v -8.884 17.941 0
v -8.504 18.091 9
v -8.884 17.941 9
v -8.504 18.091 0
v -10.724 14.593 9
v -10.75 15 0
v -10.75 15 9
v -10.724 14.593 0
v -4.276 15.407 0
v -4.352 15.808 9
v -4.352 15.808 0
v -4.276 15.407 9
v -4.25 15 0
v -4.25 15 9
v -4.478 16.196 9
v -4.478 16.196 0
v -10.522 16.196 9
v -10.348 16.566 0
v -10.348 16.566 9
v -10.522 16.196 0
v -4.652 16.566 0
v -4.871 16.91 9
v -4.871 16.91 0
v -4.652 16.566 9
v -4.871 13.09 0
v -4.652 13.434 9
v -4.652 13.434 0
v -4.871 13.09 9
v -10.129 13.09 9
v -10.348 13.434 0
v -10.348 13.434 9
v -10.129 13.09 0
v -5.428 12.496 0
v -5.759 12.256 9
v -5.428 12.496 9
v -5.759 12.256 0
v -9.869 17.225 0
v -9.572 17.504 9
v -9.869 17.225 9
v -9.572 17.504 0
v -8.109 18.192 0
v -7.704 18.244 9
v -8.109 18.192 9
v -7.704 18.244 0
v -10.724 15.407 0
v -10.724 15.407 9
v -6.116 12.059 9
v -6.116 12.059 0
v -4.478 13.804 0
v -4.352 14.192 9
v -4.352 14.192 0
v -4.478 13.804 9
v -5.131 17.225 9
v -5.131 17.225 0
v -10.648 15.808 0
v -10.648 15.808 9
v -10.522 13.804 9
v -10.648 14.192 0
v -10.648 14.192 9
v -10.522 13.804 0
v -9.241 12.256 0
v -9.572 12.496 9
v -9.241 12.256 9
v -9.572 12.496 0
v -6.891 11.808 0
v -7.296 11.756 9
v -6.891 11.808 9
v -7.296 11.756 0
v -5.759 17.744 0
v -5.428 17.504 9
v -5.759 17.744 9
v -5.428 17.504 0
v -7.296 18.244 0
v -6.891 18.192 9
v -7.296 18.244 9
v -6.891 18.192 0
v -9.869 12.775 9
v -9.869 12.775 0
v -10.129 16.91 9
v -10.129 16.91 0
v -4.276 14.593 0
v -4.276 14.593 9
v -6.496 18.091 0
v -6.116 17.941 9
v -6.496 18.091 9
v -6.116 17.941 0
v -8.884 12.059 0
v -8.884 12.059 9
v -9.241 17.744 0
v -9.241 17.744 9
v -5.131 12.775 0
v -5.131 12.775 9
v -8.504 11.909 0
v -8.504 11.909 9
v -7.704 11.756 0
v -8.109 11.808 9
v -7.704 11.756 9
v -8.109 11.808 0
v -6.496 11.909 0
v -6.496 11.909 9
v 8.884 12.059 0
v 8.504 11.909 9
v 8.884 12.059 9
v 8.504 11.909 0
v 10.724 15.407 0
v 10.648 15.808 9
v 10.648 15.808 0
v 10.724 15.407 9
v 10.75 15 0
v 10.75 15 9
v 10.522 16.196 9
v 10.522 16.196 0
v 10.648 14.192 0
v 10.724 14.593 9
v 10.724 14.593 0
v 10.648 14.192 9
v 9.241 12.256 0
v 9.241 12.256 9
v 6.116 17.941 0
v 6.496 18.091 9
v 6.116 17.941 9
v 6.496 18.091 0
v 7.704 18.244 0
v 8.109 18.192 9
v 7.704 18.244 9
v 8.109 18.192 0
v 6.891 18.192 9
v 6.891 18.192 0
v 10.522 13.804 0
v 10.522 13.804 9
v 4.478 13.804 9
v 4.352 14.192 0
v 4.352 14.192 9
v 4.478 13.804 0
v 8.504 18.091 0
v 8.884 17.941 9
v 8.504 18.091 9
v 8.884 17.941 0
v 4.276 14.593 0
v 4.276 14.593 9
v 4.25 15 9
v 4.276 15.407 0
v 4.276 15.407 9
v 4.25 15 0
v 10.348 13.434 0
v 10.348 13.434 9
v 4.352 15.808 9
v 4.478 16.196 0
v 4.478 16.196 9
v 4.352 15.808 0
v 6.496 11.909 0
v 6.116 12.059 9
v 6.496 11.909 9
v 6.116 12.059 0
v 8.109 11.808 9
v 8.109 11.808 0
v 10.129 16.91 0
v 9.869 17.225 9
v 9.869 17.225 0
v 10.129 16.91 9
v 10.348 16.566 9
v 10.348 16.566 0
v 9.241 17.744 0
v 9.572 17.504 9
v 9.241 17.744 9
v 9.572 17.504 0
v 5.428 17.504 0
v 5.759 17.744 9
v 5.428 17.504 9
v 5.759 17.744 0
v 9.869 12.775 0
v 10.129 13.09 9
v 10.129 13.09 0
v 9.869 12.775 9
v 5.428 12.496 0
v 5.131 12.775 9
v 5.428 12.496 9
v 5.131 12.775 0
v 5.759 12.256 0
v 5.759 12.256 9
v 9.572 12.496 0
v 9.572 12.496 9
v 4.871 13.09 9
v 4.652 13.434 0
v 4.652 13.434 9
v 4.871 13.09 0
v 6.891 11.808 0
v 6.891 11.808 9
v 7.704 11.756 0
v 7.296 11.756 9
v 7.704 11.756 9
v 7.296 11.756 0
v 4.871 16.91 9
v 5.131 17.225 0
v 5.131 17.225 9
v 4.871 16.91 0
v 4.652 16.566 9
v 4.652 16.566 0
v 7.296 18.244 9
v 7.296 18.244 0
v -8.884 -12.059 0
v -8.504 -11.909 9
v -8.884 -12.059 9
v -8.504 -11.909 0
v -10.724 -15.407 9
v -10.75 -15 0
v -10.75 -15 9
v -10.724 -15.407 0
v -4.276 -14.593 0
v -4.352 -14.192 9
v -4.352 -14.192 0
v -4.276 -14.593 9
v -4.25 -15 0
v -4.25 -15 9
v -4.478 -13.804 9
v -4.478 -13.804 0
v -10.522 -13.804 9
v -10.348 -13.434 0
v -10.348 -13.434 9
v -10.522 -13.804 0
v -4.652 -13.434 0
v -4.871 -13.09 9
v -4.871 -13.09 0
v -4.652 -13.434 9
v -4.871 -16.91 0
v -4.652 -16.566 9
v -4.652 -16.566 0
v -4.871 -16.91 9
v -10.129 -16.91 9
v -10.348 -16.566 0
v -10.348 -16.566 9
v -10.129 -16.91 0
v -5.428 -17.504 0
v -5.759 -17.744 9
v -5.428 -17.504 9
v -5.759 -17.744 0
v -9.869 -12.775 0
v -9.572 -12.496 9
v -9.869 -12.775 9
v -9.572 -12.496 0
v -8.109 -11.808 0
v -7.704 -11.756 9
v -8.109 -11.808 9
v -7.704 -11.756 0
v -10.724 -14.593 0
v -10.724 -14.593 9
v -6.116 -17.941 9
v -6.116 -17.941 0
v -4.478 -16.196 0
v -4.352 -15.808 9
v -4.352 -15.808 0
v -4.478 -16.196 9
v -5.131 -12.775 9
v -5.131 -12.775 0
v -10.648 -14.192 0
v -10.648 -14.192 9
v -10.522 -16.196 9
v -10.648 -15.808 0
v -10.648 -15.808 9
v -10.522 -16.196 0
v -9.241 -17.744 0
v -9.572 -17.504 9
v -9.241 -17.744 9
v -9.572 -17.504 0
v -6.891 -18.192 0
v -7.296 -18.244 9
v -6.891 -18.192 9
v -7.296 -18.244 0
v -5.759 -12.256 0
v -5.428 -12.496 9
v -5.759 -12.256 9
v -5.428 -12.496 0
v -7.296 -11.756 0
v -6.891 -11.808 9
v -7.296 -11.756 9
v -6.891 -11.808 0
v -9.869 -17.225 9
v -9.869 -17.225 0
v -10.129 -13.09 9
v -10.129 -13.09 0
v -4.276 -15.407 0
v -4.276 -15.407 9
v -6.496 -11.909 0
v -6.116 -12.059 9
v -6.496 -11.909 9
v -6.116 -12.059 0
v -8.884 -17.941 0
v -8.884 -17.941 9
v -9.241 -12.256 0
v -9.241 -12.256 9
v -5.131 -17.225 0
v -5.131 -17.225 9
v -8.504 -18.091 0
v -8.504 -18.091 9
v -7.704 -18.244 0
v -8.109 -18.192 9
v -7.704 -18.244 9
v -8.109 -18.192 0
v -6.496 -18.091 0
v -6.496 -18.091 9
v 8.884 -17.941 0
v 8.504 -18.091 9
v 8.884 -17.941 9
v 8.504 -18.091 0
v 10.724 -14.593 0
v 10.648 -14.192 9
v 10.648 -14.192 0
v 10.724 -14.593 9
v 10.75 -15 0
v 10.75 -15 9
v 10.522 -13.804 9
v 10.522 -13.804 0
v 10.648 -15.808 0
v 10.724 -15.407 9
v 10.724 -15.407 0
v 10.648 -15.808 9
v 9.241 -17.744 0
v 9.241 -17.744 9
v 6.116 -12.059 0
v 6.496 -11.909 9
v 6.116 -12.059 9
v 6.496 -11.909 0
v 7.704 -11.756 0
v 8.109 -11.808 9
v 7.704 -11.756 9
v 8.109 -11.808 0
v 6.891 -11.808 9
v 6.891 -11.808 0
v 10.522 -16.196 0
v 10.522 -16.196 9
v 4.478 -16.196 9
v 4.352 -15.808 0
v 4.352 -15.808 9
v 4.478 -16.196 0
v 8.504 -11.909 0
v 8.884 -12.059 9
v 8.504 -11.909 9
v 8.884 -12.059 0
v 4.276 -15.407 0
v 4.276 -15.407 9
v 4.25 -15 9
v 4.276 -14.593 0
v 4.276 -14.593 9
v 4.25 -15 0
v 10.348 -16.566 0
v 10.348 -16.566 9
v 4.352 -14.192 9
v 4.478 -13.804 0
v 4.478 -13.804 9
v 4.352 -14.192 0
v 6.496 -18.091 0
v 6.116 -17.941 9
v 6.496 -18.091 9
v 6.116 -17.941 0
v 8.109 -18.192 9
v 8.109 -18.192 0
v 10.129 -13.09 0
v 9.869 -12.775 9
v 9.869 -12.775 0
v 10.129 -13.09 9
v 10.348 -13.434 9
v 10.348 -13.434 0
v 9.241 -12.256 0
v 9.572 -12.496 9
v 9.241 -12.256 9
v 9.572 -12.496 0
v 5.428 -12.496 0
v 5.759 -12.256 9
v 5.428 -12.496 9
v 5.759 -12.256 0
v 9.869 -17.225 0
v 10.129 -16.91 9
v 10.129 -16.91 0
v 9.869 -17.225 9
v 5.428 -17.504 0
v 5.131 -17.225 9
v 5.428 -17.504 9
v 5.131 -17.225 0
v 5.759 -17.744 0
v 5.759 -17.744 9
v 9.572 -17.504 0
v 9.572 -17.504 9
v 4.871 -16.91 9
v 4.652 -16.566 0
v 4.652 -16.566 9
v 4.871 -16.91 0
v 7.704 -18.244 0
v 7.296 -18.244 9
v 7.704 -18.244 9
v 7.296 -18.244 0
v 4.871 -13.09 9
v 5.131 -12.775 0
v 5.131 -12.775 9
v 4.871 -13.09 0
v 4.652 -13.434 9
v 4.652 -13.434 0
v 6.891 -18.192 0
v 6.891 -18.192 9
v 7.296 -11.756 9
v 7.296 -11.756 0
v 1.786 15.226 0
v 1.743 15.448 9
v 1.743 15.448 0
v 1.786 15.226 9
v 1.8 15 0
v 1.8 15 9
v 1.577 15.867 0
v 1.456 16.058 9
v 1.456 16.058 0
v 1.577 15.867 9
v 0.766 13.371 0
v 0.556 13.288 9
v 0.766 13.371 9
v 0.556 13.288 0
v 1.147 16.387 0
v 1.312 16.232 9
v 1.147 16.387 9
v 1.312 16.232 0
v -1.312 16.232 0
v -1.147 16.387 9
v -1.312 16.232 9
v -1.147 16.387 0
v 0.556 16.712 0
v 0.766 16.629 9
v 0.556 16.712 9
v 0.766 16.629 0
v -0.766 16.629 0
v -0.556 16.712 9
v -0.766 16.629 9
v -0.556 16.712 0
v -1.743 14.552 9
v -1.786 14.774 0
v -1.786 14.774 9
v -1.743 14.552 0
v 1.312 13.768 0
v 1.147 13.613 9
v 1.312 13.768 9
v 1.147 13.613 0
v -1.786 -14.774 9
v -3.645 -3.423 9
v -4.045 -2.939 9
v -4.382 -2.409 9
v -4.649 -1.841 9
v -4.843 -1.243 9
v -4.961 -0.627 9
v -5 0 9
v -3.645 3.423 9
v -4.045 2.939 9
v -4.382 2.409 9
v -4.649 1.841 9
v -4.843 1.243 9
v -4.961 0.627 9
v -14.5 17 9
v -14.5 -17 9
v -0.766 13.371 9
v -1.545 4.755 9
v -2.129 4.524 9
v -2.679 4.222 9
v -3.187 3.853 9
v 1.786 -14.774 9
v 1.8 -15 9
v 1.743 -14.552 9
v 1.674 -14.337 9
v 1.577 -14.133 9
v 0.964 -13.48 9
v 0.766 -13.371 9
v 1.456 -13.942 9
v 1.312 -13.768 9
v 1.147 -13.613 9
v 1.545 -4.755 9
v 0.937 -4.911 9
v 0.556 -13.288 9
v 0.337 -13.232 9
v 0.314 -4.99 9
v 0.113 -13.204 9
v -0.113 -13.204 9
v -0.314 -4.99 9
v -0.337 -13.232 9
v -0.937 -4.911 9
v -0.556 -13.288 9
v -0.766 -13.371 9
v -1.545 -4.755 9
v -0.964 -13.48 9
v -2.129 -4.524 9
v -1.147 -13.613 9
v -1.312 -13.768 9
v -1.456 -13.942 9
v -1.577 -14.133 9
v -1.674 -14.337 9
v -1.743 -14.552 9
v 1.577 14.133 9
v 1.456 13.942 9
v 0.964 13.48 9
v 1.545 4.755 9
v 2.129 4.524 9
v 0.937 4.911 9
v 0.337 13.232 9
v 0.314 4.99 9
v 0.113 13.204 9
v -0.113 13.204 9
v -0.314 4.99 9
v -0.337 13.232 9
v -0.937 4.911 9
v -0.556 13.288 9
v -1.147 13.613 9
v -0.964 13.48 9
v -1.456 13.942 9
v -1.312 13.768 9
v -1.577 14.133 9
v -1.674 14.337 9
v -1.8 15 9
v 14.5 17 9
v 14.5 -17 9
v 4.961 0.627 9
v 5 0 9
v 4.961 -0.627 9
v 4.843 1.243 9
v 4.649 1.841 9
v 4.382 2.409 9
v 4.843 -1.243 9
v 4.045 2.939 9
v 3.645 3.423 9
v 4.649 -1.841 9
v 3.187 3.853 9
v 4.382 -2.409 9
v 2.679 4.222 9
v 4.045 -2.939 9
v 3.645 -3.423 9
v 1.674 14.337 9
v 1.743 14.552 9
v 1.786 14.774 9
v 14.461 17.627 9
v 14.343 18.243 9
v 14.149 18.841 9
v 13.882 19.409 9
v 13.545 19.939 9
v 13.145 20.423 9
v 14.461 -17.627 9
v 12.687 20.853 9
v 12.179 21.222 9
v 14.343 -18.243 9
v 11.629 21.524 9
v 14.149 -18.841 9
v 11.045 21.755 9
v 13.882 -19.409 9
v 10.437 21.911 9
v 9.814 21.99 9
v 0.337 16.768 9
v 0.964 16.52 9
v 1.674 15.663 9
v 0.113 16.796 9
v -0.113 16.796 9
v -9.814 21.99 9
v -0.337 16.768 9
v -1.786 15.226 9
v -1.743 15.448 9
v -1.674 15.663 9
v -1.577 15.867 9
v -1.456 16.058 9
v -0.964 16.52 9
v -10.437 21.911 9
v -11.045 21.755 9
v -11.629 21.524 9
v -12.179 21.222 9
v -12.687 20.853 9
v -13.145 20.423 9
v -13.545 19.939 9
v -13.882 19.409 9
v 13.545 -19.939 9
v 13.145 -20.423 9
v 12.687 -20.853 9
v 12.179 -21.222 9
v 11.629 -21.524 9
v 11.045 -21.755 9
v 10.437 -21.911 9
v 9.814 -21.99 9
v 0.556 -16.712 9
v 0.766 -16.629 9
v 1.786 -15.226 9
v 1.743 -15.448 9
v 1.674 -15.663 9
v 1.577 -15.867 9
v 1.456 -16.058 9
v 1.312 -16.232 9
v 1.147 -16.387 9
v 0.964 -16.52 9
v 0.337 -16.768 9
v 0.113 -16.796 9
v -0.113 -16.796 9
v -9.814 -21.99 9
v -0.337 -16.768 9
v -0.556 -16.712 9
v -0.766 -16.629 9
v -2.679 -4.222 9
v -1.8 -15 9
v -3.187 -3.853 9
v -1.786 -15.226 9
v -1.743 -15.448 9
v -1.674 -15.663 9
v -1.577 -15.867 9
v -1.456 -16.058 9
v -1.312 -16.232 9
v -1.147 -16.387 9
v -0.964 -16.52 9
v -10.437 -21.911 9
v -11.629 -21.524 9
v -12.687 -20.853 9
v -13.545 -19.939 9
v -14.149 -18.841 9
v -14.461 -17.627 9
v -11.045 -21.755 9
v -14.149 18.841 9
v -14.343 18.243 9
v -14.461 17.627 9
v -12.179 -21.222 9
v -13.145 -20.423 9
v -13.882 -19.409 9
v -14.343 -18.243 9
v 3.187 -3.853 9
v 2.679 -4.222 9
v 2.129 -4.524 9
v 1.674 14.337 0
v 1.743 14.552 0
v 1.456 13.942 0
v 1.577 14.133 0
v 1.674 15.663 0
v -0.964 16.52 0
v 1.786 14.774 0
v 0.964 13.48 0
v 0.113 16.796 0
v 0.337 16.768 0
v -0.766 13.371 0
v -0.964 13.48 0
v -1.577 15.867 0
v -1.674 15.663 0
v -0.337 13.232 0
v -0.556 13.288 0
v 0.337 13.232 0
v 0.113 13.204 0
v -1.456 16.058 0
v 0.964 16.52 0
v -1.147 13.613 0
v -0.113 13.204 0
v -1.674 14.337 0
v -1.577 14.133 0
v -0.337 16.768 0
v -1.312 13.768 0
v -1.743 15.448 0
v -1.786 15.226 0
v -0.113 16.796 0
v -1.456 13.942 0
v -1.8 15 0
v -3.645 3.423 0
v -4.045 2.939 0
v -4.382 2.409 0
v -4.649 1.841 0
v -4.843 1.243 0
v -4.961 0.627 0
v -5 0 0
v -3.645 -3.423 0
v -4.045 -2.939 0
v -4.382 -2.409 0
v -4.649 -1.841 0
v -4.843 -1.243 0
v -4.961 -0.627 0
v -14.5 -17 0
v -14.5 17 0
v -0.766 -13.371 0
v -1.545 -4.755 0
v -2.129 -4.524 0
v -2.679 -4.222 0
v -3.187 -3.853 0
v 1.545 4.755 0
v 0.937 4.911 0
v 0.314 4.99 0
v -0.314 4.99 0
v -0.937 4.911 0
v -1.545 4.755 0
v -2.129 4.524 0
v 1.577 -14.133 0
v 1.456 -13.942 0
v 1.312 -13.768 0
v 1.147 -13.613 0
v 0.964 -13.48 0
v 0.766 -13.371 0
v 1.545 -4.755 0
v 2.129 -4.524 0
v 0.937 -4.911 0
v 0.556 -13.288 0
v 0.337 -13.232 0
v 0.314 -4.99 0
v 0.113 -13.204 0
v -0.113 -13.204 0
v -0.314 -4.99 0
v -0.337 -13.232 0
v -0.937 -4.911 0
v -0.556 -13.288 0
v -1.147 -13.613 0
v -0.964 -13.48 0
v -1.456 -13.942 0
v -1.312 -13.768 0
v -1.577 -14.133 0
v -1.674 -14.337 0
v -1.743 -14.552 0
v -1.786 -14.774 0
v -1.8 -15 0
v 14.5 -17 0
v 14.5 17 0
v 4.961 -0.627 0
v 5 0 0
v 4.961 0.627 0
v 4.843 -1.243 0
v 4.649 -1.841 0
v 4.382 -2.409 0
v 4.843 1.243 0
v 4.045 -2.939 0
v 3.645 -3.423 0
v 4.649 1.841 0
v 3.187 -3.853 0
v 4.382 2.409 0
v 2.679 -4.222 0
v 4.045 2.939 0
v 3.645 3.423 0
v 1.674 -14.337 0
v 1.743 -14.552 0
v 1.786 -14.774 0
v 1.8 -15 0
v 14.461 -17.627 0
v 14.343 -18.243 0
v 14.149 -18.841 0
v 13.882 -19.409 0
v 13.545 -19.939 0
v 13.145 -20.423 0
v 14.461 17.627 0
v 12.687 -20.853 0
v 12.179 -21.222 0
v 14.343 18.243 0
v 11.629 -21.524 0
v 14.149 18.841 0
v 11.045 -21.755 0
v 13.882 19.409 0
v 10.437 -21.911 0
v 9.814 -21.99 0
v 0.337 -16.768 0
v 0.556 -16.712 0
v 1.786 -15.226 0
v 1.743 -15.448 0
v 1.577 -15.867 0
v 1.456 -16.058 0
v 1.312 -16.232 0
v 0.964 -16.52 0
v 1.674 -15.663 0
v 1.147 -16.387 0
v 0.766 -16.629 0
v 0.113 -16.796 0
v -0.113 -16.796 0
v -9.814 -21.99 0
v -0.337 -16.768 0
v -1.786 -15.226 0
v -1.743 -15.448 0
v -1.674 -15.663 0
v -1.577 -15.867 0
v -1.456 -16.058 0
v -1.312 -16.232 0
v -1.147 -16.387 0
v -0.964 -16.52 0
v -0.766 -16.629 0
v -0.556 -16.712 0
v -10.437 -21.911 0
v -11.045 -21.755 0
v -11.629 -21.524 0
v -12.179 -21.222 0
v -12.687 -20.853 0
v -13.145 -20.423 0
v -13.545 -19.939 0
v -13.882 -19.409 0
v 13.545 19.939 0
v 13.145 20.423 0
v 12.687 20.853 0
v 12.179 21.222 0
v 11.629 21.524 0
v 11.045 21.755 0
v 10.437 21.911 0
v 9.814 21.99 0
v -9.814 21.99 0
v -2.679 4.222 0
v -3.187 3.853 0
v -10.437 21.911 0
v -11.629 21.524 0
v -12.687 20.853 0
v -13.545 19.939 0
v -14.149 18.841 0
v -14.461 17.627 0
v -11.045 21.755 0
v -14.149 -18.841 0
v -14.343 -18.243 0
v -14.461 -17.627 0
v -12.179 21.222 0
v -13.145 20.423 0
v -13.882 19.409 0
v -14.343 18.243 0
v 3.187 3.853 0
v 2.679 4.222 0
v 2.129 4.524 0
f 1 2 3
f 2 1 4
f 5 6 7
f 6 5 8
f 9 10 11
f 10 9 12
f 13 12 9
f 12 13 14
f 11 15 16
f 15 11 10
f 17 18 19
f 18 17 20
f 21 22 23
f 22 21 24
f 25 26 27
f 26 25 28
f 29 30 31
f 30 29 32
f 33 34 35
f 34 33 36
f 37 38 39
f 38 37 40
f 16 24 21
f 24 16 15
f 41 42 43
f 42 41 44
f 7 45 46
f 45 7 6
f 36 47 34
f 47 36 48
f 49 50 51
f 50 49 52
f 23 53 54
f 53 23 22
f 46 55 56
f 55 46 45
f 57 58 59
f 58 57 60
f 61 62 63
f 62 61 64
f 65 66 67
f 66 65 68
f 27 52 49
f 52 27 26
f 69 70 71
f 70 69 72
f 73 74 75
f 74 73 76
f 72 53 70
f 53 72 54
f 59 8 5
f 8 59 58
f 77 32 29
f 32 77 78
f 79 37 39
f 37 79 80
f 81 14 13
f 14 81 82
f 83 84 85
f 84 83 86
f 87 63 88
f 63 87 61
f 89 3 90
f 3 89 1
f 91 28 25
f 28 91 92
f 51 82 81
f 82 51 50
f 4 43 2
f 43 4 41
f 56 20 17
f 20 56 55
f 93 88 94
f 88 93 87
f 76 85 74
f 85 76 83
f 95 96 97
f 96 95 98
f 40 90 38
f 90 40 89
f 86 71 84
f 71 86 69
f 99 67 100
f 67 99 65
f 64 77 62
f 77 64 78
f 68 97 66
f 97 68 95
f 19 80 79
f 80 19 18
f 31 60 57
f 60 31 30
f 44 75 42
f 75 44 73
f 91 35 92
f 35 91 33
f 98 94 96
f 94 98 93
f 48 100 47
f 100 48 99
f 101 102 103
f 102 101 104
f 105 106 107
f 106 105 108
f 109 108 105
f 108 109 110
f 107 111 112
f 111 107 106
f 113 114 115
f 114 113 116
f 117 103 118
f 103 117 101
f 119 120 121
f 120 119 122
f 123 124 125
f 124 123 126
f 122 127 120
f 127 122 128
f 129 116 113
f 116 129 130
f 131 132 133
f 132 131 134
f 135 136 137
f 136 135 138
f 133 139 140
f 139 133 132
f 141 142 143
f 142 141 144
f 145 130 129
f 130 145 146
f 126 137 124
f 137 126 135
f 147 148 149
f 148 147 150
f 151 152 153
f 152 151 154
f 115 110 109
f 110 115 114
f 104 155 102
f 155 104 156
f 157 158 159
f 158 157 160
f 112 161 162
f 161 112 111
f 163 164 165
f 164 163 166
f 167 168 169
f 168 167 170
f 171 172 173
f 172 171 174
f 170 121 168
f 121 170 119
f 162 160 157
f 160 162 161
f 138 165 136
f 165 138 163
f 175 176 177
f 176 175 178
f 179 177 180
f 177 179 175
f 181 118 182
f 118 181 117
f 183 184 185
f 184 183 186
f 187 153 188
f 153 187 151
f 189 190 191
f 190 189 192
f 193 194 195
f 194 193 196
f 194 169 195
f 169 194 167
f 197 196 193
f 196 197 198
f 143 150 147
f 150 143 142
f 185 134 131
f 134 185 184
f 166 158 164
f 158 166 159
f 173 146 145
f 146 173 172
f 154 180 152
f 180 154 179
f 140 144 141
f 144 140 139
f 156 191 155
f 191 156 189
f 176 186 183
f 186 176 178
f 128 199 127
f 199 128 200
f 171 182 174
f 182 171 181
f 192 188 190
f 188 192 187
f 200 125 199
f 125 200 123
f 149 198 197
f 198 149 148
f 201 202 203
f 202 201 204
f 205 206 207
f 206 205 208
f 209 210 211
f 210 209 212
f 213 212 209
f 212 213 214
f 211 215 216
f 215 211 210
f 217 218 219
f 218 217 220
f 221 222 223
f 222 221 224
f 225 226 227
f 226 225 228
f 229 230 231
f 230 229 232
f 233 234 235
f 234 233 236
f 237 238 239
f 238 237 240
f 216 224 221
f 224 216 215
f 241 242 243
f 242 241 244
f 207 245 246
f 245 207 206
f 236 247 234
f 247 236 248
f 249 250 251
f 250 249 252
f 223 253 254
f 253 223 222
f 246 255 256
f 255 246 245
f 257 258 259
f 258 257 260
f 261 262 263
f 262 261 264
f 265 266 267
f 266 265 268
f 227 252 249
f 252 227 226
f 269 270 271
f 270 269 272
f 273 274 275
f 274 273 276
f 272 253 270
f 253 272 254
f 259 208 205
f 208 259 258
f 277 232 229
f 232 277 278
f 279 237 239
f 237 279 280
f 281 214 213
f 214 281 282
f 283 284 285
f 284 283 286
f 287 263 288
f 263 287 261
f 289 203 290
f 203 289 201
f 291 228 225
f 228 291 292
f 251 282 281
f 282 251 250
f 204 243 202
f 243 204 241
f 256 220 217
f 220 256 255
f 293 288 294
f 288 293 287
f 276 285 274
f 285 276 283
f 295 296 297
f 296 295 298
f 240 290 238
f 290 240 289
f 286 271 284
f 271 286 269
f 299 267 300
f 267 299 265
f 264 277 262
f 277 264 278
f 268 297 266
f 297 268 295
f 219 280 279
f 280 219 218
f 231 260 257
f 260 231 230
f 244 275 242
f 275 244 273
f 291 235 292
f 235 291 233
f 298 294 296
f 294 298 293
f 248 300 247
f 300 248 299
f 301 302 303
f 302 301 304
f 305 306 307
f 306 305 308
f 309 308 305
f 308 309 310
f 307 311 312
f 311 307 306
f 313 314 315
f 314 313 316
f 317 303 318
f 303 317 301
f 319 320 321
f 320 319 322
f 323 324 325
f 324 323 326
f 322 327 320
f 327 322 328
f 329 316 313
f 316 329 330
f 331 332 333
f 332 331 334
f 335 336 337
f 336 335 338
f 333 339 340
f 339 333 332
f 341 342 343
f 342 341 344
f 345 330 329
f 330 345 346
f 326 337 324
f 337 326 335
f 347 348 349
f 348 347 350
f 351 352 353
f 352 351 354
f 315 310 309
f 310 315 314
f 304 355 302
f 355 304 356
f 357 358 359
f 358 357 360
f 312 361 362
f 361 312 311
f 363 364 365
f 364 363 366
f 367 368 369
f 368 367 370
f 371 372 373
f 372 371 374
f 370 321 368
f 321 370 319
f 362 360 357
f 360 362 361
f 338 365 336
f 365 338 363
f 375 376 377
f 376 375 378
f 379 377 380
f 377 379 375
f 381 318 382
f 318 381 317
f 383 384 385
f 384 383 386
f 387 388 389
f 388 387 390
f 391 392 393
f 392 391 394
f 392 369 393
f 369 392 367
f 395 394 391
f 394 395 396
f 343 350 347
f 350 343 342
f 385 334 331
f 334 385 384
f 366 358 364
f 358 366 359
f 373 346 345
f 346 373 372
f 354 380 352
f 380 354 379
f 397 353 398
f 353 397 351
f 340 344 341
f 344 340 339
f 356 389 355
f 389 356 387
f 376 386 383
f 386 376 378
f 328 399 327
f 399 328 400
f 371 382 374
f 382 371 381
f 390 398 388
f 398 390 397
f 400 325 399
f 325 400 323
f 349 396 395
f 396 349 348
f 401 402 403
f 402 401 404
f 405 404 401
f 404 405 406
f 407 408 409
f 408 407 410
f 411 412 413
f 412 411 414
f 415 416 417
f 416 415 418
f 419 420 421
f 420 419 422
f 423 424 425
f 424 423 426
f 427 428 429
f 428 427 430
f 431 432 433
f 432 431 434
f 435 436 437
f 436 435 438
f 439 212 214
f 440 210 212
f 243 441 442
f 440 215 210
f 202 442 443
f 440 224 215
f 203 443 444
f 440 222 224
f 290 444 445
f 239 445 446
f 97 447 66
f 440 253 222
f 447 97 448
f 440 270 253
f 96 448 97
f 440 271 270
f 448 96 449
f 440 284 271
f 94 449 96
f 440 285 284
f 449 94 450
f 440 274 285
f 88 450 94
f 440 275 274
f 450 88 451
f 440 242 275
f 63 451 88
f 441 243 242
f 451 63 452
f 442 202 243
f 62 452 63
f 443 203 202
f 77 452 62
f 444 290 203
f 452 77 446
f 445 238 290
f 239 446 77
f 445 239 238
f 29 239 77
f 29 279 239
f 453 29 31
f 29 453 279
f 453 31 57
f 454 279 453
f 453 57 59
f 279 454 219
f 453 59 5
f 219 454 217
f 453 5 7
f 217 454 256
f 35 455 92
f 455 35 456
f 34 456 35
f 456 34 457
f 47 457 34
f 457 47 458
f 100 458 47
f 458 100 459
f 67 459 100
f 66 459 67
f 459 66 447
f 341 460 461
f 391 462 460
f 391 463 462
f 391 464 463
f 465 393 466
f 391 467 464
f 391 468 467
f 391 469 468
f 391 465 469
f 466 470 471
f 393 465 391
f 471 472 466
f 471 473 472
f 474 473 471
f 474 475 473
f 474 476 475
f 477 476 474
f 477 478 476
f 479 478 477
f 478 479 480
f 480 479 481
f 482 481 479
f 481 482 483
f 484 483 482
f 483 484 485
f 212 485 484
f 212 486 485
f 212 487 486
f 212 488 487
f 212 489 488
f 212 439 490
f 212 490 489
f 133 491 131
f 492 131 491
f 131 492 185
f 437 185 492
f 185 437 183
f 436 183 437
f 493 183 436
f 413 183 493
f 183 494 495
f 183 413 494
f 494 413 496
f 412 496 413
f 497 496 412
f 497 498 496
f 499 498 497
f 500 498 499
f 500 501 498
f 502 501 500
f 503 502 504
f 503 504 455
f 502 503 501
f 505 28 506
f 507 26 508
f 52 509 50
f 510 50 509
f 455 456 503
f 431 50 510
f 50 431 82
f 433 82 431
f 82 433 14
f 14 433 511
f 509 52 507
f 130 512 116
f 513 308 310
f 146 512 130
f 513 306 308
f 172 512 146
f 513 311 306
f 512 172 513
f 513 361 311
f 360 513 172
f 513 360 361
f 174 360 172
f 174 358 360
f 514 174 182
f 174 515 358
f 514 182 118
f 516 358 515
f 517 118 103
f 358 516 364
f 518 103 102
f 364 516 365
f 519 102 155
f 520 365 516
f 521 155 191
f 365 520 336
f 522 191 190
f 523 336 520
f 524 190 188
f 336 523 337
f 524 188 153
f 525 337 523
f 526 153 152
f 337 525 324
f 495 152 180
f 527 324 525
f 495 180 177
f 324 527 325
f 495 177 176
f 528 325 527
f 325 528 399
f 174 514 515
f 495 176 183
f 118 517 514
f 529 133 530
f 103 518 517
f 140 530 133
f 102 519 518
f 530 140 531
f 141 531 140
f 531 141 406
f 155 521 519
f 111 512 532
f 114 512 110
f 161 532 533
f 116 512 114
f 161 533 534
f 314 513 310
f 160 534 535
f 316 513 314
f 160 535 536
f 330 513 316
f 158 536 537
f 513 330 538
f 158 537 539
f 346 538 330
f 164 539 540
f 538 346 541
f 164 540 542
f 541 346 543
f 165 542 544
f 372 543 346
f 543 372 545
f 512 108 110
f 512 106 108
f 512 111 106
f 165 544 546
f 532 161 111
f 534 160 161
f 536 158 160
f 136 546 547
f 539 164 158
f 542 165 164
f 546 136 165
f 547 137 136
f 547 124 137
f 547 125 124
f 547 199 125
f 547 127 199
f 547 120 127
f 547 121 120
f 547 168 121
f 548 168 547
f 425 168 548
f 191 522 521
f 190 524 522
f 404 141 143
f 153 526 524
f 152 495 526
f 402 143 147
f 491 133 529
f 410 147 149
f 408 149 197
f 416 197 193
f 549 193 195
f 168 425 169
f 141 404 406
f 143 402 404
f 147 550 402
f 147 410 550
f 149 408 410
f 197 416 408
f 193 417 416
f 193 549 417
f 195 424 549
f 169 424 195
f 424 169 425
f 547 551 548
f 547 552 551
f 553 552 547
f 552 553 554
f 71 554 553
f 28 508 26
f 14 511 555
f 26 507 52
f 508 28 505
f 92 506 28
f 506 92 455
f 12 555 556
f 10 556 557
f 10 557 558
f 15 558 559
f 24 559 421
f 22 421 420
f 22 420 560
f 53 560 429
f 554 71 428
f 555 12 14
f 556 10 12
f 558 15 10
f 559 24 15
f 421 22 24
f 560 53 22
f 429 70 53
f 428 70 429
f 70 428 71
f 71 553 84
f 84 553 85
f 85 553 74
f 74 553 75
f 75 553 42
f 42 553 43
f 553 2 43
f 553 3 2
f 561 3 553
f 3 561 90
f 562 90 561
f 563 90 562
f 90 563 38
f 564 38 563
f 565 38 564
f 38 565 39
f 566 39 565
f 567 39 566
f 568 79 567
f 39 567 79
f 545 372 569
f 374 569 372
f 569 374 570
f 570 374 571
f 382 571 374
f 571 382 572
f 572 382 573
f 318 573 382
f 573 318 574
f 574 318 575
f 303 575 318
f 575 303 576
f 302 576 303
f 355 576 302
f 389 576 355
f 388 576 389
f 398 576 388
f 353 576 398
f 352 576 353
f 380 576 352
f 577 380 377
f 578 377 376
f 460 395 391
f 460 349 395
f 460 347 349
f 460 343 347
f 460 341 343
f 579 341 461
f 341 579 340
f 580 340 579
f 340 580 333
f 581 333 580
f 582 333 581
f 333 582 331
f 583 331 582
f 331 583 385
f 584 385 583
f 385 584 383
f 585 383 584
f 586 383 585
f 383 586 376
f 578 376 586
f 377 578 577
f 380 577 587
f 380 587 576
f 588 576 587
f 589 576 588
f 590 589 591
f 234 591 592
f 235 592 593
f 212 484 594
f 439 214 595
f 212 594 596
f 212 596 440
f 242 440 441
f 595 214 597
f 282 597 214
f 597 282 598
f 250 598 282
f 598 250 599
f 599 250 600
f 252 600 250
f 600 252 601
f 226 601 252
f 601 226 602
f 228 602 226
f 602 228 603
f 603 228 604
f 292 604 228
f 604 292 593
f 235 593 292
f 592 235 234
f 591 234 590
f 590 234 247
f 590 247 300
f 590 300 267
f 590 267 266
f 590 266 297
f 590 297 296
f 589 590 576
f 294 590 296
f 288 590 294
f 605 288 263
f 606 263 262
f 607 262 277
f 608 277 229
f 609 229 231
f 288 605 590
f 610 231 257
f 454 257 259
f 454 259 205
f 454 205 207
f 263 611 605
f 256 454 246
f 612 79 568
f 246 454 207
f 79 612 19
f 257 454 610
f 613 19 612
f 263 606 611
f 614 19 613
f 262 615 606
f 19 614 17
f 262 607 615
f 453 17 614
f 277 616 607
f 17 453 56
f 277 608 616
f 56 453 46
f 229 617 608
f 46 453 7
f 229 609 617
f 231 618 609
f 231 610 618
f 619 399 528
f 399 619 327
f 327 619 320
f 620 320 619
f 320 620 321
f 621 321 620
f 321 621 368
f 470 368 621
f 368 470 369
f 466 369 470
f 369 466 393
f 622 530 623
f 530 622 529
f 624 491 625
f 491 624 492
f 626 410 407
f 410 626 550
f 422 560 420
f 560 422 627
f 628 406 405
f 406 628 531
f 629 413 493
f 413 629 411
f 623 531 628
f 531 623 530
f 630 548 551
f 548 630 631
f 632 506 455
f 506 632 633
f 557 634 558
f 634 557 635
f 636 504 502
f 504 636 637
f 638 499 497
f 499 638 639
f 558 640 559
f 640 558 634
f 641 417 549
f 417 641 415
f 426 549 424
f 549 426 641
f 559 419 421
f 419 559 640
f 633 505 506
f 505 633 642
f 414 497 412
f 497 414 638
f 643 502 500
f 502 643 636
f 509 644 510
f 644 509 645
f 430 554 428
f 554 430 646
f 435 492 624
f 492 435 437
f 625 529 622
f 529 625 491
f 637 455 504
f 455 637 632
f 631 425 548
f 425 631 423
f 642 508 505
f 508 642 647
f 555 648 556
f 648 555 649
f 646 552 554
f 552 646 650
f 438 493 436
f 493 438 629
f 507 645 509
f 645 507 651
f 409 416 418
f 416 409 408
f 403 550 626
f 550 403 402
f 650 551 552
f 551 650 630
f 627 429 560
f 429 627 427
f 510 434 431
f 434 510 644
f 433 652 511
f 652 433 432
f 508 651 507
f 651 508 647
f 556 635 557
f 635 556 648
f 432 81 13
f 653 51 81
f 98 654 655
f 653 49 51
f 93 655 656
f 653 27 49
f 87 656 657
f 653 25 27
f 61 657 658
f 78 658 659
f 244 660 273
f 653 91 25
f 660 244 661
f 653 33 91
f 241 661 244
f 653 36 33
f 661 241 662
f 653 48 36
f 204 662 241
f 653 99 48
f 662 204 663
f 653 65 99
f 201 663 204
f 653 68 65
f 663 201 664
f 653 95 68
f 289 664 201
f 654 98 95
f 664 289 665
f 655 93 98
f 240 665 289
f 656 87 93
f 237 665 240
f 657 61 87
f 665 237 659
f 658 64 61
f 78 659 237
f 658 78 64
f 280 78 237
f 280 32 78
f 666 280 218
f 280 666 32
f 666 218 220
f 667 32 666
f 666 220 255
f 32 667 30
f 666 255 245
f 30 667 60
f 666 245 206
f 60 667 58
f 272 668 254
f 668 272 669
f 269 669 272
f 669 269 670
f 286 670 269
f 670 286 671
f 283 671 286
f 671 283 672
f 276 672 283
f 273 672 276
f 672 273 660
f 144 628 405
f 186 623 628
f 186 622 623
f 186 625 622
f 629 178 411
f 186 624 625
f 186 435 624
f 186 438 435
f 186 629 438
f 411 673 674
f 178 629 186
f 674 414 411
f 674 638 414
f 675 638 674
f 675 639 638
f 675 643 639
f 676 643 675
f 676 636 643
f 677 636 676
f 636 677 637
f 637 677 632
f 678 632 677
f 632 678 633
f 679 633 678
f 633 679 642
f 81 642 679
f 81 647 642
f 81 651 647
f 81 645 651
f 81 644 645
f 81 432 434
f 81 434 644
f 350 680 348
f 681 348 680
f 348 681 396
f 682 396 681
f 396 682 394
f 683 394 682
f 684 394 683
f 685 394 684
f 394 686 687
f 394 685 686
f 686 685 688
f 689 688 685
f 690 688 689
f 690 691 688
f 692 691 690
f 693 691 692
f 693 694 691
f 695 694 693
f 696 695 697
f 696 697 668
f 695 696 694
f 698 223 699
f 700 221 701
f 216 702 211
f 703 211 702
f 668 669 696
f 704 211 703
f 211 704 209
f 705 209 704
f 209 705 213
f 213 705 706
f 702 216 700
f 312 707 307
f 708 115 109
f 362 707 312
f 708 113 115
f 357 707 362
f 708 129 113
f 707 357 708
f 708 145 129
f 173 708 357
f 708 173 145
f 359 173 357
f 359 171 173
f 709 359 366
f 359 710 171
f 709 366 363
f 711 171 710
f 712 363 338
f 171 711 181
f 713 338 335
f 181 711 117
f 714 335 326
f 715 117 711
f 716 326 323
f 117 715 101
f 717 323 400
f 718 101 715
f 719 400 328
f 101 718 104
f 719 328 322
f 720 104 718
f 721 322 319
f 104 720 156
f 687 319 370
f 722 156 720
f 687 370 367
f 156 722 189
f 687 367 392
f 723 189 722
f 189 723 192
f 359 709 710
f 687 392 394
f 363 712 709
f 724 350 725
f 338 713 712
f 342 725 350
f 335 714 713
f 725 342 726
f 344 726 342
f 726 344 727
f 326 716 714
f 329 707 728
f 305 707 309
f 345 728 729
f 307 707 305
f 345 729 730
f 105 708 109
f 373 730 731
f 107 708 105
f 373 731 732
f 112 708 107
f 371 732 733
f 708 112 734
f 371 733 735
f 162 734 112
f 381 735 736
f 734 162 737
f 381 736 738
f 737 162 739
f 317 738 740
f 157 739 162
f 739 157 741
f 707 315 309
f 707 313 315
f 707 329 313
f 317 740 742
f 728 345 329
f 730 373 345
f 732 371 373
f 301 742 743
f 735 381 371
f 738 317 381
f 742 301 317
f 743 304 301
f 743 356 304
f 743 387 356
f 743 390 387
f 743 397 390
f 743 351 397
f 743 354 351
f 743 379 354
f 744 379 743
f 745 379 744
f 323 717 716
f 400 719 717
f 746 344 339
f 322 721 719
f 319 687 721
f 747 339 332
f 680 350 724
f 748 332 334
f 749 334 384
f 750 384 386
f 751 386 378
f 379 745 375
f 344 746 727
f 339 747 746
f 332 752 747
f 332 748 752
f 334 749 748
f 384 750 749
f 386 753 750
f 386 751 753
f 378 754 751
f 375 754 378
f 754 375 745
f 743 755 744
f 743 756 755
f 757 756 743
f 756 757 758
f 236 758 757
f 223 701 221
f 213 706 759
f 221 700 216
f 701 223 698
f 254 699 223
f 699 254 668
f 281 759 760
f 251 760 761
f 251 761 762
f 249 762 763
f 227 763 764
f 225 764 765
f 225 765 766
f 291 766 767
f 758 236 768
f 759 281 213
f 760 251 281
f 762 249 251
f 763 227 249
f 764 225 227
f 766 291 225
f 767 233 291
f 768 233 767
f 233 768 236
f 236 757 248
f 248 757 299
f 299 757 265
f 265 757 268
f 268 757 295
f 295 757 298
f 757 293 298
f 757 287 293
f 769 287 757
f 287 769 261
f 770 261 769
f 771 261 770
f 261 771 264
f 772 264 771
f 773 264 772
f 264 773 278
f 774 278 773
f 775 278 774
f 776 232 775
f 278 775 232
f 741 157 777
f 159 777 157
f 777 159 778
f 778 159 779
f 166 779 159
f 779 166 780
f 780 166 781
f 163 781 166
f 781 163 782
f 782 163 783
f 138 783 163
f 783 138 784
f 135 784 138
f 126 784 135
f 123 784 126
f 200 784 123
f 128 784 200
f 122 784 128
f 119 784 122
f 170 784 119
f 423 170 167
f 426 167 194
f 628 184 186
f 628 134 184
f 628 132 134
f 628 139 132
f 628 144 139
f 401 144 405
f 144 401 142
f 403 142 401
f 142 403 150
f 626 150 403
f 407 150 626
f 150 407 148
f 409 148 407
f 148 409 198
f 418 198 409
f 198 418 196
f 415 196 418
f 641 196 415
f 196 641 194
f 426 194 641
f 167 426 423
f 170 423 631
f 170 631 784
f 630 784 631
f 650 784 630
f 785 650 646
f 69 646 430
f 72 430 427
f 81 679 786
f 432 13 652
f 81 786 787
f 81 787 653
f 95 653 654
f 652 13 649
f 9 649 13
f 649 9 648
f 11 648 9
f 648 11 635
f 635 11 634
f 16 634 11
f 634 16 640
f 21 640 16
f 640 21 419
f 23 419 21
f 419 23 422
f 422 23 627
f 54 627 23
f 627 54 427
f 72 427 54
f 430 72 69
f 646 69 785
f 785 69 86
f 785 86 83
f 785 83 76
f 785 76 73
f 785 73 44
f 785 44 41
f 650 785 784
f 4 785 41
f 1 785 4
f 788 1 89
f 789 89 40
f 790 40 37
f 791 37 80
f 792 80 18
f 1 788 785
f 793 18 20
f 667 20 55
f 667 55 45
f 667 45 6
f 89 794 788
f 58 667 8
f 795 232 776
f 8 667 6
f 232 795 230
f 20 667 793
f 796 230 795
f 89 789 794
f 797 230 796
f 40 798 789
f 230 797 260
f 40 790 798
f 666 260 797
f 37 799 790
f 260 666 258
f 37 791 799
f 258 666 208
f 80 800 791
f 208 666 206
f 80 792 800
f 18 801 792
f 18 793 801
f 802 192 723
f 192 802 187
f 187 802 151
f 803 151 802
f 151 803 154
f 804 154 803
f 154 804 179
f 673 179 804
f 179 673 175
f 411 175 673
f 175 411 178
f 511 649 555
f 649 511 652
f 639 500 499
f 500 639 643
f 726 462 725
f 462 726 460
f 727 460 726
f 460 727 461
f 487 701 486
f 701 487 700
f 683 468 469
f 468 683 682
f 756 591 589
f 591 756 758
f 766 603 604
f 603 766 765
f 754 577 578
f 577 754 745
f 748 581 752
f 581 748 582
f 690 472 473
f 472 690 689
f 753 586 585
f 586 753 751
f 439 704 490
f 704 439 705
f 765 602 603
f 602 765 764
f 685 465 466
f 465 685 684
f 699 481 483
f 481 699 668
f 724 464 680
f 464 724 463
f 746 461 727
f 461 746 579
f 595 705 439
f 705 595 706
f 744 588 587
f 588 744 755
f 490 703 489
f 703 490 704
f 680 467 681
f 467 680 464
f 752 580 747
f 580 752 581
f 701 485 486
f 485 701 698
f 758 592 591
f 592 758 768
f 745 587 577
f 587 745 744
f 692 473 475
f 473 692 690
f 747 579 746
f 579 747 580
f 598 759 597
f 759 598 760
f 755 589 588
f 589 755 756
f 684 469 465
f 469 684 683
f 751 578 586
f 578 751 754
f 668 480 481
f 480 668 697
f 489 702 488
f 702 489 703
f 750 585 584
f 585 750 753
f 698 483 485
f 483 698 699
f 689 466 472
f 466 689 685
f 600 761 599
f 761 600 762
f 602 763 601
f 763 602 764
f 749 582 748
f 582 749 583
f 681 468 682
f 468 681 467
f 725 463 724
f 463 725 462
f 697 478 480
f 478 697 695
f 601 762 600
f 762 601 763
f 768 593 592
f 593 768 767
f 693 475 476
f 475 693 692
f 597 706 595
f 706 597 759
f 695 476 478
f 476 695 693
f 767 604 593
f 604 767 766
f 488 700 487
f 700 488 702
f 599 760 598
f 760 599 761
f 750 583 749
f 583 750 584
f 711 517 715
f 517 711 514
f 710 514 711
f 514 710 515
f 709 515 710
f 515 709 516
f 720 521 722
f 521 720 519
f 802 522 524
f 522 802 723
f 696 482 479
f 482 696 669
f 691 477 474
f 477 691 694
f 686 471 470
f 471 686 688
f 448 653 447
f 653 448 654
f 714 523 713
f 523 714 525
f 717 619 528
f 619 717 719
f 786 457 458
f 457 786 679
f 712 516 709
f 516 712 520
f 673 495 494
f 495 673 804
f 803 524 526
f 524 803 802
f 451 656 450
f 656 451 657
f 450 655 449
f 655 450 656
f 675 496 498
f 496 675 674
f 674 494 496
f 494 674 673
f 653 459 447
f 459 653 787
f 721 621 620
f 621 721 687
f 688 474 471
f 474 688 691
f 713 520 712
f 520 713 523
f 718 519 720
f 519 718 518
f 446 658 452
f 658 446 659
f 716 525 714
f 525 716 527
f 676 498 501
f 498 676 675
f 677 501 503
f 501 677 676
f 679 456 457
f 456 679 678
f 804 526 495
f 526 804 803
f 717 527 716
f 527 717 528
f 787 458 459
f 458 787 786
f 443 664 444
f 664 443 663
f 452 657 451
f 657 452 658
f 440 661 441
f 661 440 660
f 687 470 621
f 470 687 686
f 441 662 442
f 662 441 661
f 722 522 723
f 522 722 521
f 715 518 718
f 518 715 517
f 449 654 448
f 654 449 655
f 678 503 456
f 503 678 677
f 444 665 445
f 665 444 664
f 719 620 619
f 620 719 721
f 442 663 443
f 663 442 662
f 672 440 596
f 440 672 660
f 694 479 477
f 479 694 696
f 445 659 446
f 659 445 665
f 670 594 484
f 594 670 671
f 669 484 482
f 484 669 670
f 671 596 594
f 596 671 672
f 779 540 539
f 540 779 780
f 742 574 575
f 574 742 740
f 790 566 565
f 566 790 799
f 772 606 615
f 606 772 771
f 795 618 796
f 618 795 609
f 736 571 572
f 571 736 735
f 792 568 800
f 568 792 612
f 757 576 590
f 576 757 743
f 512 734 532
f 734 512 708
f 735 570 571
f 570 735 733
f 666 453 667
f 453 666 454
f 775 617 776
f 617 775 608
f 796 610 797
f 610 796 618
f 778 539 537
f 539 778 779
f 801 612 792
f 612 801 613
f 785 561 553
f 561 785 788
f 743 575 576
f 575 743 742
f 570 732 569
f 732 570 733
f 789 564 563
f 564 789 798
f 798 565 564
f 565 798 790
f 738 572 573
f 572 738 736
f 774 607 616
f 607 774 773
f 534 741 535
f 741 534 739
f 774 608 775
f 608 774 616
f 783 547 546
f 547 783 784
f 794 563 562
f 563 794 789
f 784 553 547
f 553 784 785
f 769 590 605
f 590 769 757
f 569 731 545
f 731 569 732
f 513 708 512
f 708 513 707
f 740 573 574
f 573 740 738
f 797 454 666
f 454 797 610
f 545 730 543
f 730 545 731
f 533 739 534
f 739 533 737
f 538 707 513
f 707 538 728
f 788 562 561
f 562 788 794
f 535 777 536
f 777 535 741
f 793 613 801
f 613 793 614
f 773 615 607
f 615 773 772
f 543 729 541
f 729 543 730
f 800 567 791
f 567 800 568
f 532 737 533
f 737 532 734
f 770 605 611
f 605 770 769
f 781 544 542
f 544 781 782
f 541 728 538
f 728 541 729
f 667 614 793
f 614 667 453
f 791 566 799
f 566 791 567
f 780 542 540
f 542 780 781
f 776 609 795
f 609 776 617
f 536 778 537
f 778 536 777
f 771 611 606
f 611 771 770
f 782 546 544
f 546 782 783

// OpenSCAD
$fn = 50;


difference() {
	union() {
		hull() {
			translate(v = [-9.5000000000, 17.0000000000, 0]) {
				cylinder(h = 9, r = 5);
			}
			translate(v = [9.5000000000, 17.0000000000, 0]) {
				cylinder(h = 9, r = 5);
			}
			translate(v = [-9.5000000000, -17.0000000000, 0]) {
				cylinder(h = 9, r = 5);
			}
			translate(v = [9.5000000000, -17.0000000000, 0]) {
				cylinder(h = 9, r = 5);
			}
		}
	}
	union() {
		#translate(v = [-7.5000000000, 15.0000000000, 0]) {
			cylinder(h = 9, r = 3.2500000000);
		}
		#translate(v = [7.5000000000, 15.0000000000, 0]) {
			cylinder(h = 9, r = 3.2500000000);
		}
		#translate(v = [-7.5000000000, -15.0000000000, 0]) {
			cylinder(h = 9, r = 3.2500000000);
		}
		#translate(v = [7.5000000000, -15.0000000000, 0]) {
			cylinder(h = 9, r = 3.2500000000);
		}
		#translate(v = [-7.5000000000, -15.0000000000, -100.0000000000]) {
			cylinder(h = 200, r = 3.2500000000);
		}
		#translate(v = [-7.5000000000, 15.0000000000, -100.0000000000]) {
			cylinder(h = 200, r = 3.2500000000);
		}
		#translate(v = [7.5000000000, -15.0000000000, -100.0000000000]) {
			cylinder(h = 200, r = 3.2500000000);
		}
		#translate(v = [7.5000000000, 15.0000000000, -100.0000000000]) {
			cylinder(h = 200, r = 3.2500000000);
		}
		#translate(v = [-7.5000000000, 15.0000000000, 0]) {
			cylinder(h = 9, r = 1.8000000000);
		}
		#translate(v = [0.0000000000, 15.0000000000, 0]) {
			cylinder(h = 9, r = 1.8000000000);
		}
		#translate(v = [7.5000000000, 15.0000000000, 0]) {
			cylinder(h = 9, r = 1.8000000000);
		}
		#translate(v = [-7.5000000000, -15.0000000000, 0]) {
			cylinder(h = 9, r = 1.8000000000);
		}
		#translate(v = [0.0000000000, -15.0000000000, 0]) {
			cylinder(h = 9, r = 1.8000000000);
		}
		#translate(v = [7.5000000000, -15.0000000000, 0]) {
			cylinder(h = 9, r = 1.8000000000);
		}
		#translate(v = [-7.5000000000, 15.0000000000, 0]) {
			cylinder(h = 9, r = 1.8000000000);
		}
		#translate(v = [0.0000000000, 15.0000000000, 0]) {
			cylinder(h = 9, r = 1.8000000000);
		}
		#translate(v = [7.5000000000, 15.0000000000, 0]) {
			cylinder(h = 9, r = 1.8000000000);
		}
		#translate(v = [-7.5000000000, -15.0000000000, 0]) {
			cylinder(h = 9, r = 1.8000000000);
		}
		#translate(v = [0.0000000000, -15.0000000000, 0]) {
			cylinder(h = 9, r = 1.8000000000);
		}
		#translate(v = [7.5000000000, -15.0000000000, 0]) {
			cylinder(h = 9, r = 1.8000000000);
		}
		#translate(v = [-7.5000000000, 15.0000000000, 0]) {
			cylinder(h = 9, r = 1.8000000000);
		}
		#translate(v = [0.0000000000, 15.0000000000, 0]) {
			cylinder(h = 9, r = 1.8000000000);
		}
		#translate(v = [7.5000000000, 15.0000000000, 0]) {
			cylinder(h = 9, r = 1.8000000000);
		}
		#translate(v = [-7.5000000000, -15.0000000000, 0]) {
			cylinder(h = 9, r = 1.8000000000);
		}
		#translate(v = [0.0000000000, -15.0000000000, 0]) {
			cylinder(h = 9, r = 1.8000000000);
		}
		#translate(v = [7.5000000000, -15.0000000000, 0]) {
			cylinder(h = 9, r = 1.8000000000);
		}
		#cylinder(h = 9, r = 5.0000000000);
	}
}
